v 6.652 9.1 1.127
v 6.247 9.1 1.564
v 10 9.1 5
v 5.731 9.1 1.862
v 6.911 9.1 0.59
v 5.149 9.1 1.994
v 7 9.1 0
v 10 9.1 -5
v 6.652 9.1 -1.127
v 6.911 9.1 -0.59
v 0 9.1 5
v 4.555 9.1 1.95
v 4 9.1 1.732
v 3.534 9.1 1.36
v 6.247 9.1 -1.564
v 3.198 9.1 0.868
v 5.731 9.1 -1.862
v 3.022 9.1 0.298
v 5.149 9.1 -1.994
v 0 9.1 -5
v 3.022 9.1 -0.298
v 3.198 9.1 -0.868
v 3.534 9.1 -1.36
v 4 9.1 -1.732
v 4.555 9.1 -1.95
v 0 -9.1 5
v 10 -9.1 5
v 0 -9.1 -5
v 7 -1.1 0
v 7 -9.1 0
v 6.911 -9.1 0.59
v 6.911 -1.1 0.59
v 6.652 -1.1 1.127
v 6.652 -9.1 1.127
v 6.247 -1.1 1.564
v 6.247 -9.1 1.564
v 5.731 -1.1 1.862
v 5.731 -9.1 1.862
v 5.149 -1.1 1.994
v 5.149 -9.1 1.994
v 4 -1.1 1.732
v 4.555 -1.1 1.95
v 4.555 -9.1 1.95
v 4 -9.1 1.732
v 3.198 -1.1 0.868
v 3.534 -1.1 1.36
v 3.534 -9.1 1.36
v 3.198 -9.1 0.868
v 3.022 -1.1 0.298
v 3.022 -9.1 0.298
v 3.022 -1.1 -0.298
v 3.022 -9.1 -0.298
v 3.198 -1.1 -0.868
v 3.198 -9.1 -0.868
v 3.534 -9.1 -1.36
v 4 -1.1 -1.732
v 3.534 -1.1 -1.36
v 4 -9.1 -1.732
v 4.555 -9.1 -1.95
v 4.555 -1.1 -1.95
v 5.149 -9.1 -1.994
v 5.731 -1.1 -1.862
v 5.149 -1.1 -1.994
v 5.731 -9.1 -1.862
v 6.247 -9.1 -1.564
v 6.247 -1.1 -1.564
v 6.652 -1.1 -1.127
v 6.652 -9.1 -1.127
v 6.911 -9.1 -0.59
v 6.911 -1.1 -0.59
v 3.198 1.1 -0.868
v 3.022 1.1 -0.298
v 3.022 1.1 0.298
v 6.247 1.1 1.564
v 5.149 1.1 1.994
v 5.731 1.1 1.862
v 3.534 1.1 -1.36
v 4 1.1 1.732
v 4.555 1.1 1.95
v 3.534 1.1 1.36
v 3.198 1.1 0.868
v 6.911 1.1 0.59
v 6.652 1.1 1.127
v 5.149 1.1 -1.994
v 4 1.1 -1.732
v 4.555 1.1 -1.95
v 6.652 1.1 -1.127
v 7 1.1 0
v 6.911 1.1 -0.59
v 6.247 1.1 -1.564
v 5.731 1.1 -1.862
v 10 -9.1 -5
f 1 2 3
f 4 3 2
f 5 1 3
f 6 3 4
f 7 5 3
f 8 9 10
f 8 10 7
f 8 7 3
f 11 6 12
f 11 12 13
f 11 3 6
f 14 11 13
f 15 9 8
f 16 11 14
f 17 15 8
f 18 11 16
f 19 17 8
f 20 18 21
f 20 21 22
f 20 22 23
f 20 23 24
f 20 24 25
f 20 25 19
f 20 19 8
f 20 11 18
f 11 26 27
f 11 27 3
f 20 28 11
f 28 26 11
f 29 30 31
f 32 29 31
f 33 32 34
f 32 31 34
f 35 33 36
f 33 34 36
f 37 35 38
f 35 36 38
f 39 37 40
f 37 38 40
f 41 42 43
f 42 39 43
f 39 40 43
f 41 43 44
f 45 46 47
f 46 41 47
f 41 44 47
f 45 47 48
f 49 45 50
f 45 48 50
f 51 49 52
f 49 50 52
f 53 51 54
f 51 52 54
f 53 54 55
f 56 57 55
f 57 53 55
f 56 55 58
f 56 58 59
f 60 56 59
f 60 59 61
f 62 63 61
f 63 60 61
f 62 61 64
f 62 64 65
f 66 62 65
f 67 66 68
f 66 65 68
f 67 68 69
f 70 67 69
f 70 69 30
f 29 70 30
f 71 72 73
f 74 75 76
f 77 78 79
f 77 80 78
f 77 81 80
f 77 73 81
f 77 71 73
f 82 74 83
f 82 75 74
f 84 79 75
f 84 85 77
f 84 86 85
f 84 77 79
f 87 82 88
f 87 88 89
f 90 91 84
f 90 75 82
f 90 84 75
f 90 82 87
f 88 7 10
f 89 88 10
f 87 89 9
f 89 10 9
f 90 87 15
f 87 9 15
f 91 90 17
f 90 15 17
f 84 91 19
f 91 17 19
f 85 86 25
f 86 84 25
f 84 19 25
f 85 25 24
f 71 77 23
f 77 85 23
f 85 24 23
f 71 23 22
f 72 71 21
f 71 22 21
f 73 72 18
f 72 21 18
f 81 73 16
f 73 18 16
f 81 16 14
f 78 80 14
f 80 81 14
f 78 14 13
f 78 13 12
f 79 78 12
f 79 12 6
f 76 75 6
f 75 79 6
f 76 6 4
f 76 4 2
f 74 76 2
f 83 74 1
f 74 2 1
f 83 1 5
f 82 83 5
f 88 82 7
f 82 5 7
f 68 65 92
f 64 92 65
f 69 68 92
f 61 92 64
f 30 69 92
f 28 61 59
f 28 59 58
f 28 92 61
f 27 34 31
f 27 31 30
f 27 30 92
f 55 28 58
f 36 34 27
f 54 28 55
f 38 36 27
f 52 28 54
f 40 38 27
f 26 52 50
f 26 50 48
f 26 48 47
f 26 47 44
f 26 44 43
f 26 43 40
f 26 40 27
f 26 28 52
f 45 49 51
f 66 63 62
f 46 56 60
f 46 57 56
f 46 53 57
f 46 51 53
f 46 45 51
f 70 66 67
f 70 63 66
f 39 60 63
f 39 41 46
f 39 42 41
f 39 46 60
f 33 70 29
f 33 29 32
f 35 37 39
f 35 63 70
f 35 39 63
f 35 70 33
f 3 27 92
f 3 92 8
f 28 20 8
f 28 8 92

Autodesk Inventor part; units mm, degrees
ref_plane "YZ Plane" through (0, 0, 0) normal (1, 0, 0) x (0, 1, 0)
ref_plane "XZ Plane" through (0, 0, 0) normal (0, 1, 0) x (-1, 0, 0)
ref_plane "XY Plane" through (0, 0, 0) normal (0, 0, 1) x (1, 0, 0)
sketch "Sketch1" plane through (0, 0, 0) normal (1, 0, 0) x (0, 1, 0)
  line L0 (-9.1, 5) -> (9.1, 5)
  line L1 (9.1, 5) -> (9.1, -5)
  line L2 (9.1, -5) -> (-9.1, -5)
  line L3 (-9.1, -5) -> (-9.1, 5)
  line L4 (-9.1, 5) -> (9.1, -5) construction
  line L5 (9.1, 5) -> (-9.1, -5) construction
  point P0 (0, 0)
  dimension "d0" = 18.2
  dimension "d1" = 10
extrude "Extrusion1" add sketch "Sketch1" along normal blind 10
sketch "Sketch2" plane through (0, 9.1, 5) normal (0, 1, 0) x (1, 0, 0)
  line L0 (0, 5) -> (5, 5)
  circle A0 centre (5, 5) radius 2
  dimension "d4" = 5
  dimension "d5" = 4
extrude "Extrusion2" cut sketch "Sketch2" against normal blind 8
thread "Thread1" size "M4x0.7" class "6H" standard "ANSI Metric M Profile" full length
sketch "Sketch3" plane through (0, -9.1, -5) normal (0, -1, 0) x (1, 0, 0)
  line L0 (0, 5) -> (5, 5)
  circle A0 centre (5, 5) radius 2
  dimension "d10" = 5
  dimension "d11" = 4
extrude "Extrusion3" cut sketch "Sketch3" against normal blind 8
thread "Thread2" size "M4x0.7" class "6H" standard "ANSI Metric M Profile" full length
properties part number "Rb PEEK - Soporte"
